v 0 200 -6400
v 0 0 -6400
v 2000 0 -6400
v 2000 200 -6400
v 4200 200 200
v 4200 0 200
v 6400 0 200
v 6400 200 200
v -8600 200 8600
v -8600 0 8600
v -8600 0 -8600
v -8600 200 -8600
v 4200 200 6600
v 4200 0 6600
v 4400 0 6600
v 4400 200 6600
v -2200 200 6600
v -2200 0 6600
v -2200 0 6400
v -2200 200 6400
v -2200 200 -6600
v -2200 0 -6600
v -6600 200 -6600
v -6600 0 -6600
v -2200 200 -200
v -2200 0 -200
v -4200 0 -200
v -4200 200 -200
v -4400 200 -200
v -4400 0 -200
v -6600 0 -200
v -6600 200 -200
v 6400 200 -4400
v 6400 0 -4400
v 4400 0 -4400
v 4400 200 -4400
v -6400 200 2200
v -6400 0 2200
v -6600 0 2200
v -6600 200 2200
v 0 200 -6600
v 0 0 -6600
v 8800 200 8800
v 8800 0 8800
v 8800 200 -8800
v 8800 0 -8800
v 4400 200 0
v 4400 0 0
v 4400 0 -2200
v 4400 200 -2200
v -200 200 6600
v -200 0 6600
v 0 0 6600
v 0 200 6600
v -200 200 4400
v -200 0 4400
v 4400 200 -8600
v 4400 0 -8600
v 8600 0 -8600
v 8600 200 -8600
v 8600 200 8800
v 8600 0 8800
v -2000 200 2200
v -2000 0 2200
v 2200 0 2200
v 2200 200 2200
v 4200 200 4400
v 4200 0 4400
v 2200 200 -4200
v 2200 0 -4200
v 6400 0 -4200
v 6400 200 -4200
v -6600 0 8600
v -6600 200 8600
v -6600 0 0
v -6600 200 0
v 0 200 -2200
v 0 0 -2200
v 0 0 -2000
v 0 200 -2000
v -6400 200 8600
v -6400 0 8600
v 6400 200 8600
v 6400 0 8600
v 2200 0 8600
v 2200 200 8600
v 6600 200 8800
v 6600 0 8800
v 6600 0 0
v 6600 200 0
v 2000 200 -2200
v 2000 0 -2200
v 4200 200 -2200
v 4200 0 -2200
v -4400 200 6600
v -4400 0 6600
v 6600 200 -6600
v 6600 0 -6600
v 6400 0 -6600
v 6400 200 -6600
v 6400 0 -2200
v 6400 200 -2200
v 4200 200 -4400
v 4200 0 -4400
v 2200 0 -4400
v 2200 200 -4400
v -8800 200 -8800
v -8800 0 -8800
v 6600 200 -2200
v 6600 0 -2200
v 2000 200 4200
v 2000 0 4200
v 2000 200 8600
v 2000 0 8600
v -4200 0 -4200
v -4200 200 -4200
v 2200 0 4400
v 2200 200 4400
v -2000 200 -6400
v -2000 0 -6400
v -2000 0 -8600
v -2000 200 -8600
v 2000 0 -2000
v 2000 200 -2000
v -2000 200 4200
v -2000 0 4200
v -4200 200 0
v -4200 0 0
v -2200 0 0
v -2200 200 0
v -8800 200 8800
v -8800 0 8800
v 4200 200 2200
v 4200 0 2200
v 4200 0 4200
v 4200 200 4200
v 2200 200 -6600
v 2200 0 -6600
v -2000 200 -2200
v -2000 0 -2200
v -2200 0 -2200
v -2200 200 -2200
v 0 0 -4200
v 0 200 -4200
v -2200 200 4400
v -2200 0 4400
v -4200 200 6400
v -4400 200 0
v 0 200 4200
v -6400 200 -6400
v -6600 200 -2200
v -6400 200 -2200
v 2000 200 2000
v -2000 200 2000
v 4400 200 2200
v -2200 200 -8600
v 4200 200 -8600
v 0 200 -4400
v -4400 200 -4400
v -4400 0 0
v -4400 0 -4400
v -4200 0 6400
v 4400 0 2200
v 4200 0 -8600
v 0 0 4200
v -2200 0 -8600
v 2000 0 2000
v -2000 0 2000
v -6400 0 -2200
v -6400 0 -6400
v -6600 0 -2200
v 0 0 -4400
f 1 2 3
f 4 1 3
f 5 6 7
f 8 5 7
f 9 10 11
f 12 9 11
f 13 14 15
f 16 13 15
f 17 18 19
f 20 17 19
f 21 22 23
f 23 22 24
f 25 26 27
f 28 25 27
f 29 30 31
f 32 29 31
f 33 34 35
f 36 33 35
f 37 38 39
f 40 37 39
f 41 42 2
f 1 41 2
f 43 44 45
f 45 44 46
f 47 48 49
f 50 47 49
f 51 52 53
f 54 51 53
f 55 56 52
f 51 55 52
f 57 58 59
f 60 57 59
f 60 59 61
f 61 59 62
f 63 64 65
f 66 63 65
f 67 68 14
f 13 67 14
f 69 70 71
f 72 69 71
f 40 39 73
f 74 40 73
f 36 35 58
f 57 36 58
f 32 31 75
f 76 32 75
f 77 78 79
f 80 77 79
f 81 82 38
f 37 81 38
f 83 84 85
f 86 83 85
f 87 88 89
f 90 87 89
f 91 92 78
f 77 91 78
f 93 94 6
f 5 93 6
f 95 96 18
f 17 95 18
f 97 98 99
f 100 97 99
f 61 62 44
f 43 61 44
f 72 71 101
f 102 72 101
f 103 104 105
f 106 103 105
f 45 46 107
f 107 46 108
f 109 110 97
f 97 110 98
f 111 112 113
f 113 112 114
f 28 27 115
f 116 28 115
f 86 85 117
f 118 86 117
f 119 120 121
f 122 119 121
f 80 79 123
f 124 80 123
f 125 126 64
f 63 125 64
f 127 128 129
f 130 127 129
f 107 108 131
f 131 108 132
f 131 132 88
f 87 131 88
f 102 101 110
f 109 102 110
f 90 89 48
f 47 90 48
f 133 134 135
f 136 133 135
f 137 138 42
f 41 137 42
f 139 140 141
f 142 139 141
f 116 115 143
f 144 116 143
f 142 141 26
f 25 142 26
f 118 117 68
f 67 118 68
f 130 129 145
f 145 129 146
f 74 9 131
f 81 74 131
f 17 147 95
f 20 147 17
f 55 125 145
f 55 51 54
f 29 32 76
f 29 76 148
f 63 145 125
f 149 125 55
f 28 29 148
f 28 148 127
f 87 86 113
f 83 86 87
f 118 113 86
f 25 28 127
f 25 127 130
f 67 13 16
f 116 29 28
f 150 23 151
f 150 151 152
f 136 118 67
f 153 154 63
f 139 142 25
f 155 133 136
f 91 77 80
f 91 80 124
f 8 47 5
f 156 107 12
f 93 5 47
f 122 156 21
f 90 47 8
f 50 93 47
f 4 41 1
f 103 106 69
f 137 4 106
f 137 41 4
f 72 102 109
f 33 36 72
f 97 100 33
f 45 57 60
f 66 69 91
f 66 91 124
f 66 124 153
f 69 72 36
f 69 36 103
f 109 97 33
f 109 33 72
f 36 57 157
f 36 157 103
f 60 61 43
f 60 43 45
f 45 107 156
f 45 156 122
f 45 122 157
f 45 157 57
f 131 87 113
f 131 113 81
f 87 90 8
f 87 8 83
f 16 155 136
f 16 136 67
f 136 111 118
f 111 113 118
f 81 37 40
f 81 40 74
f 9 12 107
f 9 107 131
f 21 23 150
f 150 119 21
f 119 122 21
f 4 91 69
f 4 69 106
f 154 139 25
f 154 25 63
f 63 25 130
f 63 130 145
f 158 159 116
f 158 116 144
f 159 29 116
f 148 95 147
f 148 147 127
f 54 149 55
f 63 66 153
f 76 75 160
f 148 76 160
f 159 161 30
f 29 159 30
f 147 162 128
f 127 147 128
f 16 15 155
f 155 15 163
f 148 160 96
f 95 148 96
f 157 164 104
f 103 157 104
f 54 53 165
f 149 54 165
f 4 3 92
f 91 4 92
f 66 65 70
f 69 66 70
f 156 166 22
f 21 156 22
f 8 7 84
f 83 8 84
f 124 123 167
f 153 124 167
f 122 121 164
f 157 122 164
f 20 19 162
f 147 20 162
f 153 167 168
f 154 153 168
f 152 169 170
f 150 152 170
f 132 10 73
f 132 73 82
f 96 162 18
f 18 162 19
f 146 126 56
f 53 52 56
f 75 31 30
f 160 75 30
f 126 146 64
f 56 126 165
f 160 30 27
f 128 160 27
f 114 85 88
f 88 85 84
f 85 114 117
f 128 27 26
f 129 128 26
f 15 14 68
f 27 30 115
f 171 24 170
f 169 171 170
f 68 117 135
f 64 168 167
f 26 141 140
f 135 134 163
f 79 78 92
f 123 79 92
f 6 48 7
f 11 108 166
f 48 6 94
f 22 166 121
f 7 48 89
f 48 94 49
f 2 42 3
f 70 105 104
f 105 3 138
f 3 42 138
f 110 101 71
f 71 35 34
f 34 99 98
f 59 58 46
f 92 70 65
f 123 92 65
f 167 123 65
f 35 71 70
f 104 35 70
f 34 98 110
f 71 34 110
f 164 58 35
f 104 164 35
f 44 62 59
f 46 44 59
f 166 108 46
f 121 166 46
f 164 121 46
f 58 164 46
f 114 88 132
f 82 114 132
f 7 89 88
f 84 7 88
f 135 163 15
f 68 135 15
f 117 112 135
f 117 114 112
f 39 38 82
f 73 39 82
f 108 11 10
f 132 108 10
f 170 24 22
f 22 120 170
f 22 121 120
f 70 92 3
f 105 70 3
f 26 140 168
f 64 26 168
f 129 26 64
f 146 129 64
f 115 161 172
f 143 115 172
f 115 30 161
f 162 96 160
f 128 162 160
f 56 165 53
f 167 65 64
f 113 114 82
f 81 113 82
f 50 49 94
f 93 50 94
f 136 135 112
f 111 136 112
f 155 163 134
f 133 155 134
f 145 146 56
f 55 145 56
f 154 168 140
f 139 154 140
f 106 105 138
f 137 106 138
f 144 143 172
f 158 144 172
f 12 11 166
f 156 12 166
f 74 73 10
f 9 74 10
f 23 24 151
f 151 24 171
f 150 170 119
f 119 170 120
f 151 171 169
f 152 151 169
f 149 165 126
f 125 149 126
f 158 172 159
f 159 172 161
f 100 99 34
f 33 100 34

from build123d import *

# Parameters (mm, degrees)
BOSS_EXTRUDE1_DEPTH = 200


with BuildPart() as part:
    # Sketch1 → Boss-Extrude1 (new body)
    with BuildSketch(Plane(origin=(0, 0, 0), x_dir=(1, 0, 0), z_dir=(0, 1, 0))):
        Polygon((2200, -2200), (2200, 4200), (6400, 4200), (6400, 2200), (6600, 2200), (6600, 6600), (6400, 6600), (6400, 4400), (4400, 4400), (4400, 8600), (8600, 8600), (8600, -8800), (8800, -8800), (8800, 8800), (-8800, 8800), (-8800, -8800), (6600, -8800), (6600, 0), (4400, 0), (4400, 2200), (4200, 2200), (4200, -200), (6400, -200), (6400, -8600), (2200, -8600), (2200, -4400), (4200, -4400), (4200, -6600), (4400, -6600), (4400, -2200), (4200, -2200), (4200, -4200), (2000, -4200), (2000, -8600), (-6400, -8600), (-6400, -2200), (-6600, -2200), (-6600, -8600), (-8600, -8600), (-8600, 8600), (-2200, 8600), (-2200, 6600), (-6600, 6600), (-6600, 2200), (-6400, 2200), (-6400, 6400), (-2000, 6400), (-2000, 8600), (4200, 8600), (4200, 4400), (2200, 4400), (2200, 6600), (0, 6600), (0, 6400), (2000, 6400), (2000, 2200), (0, 2200), (0, 2000), (2000, 2000), (2000, -2000), (-2000, -2000), (-2000, 2200), (-2200, 2200), (-2200, 200), (-4200, 200), (-4200, 4200), (0, 4200), (0, 4400), (-4400, 4400), (-4400, 200), (-6600, 200), (-6600, 0), (-4400, 0), (-4400, -6600), (-2200, -6600), (-2200, -6400), (-4200, -6400), (-4200, 0), (-2200, 0), (-2200, -4400), (-200, -4400), (-200, -6600), (0, -6600), (0, -4200), (-2000, -4200), (-2000, -2200), align=None)
    extrude(amount=BOSS_EXTRUDE1_DEPTH)


solid = part.part
